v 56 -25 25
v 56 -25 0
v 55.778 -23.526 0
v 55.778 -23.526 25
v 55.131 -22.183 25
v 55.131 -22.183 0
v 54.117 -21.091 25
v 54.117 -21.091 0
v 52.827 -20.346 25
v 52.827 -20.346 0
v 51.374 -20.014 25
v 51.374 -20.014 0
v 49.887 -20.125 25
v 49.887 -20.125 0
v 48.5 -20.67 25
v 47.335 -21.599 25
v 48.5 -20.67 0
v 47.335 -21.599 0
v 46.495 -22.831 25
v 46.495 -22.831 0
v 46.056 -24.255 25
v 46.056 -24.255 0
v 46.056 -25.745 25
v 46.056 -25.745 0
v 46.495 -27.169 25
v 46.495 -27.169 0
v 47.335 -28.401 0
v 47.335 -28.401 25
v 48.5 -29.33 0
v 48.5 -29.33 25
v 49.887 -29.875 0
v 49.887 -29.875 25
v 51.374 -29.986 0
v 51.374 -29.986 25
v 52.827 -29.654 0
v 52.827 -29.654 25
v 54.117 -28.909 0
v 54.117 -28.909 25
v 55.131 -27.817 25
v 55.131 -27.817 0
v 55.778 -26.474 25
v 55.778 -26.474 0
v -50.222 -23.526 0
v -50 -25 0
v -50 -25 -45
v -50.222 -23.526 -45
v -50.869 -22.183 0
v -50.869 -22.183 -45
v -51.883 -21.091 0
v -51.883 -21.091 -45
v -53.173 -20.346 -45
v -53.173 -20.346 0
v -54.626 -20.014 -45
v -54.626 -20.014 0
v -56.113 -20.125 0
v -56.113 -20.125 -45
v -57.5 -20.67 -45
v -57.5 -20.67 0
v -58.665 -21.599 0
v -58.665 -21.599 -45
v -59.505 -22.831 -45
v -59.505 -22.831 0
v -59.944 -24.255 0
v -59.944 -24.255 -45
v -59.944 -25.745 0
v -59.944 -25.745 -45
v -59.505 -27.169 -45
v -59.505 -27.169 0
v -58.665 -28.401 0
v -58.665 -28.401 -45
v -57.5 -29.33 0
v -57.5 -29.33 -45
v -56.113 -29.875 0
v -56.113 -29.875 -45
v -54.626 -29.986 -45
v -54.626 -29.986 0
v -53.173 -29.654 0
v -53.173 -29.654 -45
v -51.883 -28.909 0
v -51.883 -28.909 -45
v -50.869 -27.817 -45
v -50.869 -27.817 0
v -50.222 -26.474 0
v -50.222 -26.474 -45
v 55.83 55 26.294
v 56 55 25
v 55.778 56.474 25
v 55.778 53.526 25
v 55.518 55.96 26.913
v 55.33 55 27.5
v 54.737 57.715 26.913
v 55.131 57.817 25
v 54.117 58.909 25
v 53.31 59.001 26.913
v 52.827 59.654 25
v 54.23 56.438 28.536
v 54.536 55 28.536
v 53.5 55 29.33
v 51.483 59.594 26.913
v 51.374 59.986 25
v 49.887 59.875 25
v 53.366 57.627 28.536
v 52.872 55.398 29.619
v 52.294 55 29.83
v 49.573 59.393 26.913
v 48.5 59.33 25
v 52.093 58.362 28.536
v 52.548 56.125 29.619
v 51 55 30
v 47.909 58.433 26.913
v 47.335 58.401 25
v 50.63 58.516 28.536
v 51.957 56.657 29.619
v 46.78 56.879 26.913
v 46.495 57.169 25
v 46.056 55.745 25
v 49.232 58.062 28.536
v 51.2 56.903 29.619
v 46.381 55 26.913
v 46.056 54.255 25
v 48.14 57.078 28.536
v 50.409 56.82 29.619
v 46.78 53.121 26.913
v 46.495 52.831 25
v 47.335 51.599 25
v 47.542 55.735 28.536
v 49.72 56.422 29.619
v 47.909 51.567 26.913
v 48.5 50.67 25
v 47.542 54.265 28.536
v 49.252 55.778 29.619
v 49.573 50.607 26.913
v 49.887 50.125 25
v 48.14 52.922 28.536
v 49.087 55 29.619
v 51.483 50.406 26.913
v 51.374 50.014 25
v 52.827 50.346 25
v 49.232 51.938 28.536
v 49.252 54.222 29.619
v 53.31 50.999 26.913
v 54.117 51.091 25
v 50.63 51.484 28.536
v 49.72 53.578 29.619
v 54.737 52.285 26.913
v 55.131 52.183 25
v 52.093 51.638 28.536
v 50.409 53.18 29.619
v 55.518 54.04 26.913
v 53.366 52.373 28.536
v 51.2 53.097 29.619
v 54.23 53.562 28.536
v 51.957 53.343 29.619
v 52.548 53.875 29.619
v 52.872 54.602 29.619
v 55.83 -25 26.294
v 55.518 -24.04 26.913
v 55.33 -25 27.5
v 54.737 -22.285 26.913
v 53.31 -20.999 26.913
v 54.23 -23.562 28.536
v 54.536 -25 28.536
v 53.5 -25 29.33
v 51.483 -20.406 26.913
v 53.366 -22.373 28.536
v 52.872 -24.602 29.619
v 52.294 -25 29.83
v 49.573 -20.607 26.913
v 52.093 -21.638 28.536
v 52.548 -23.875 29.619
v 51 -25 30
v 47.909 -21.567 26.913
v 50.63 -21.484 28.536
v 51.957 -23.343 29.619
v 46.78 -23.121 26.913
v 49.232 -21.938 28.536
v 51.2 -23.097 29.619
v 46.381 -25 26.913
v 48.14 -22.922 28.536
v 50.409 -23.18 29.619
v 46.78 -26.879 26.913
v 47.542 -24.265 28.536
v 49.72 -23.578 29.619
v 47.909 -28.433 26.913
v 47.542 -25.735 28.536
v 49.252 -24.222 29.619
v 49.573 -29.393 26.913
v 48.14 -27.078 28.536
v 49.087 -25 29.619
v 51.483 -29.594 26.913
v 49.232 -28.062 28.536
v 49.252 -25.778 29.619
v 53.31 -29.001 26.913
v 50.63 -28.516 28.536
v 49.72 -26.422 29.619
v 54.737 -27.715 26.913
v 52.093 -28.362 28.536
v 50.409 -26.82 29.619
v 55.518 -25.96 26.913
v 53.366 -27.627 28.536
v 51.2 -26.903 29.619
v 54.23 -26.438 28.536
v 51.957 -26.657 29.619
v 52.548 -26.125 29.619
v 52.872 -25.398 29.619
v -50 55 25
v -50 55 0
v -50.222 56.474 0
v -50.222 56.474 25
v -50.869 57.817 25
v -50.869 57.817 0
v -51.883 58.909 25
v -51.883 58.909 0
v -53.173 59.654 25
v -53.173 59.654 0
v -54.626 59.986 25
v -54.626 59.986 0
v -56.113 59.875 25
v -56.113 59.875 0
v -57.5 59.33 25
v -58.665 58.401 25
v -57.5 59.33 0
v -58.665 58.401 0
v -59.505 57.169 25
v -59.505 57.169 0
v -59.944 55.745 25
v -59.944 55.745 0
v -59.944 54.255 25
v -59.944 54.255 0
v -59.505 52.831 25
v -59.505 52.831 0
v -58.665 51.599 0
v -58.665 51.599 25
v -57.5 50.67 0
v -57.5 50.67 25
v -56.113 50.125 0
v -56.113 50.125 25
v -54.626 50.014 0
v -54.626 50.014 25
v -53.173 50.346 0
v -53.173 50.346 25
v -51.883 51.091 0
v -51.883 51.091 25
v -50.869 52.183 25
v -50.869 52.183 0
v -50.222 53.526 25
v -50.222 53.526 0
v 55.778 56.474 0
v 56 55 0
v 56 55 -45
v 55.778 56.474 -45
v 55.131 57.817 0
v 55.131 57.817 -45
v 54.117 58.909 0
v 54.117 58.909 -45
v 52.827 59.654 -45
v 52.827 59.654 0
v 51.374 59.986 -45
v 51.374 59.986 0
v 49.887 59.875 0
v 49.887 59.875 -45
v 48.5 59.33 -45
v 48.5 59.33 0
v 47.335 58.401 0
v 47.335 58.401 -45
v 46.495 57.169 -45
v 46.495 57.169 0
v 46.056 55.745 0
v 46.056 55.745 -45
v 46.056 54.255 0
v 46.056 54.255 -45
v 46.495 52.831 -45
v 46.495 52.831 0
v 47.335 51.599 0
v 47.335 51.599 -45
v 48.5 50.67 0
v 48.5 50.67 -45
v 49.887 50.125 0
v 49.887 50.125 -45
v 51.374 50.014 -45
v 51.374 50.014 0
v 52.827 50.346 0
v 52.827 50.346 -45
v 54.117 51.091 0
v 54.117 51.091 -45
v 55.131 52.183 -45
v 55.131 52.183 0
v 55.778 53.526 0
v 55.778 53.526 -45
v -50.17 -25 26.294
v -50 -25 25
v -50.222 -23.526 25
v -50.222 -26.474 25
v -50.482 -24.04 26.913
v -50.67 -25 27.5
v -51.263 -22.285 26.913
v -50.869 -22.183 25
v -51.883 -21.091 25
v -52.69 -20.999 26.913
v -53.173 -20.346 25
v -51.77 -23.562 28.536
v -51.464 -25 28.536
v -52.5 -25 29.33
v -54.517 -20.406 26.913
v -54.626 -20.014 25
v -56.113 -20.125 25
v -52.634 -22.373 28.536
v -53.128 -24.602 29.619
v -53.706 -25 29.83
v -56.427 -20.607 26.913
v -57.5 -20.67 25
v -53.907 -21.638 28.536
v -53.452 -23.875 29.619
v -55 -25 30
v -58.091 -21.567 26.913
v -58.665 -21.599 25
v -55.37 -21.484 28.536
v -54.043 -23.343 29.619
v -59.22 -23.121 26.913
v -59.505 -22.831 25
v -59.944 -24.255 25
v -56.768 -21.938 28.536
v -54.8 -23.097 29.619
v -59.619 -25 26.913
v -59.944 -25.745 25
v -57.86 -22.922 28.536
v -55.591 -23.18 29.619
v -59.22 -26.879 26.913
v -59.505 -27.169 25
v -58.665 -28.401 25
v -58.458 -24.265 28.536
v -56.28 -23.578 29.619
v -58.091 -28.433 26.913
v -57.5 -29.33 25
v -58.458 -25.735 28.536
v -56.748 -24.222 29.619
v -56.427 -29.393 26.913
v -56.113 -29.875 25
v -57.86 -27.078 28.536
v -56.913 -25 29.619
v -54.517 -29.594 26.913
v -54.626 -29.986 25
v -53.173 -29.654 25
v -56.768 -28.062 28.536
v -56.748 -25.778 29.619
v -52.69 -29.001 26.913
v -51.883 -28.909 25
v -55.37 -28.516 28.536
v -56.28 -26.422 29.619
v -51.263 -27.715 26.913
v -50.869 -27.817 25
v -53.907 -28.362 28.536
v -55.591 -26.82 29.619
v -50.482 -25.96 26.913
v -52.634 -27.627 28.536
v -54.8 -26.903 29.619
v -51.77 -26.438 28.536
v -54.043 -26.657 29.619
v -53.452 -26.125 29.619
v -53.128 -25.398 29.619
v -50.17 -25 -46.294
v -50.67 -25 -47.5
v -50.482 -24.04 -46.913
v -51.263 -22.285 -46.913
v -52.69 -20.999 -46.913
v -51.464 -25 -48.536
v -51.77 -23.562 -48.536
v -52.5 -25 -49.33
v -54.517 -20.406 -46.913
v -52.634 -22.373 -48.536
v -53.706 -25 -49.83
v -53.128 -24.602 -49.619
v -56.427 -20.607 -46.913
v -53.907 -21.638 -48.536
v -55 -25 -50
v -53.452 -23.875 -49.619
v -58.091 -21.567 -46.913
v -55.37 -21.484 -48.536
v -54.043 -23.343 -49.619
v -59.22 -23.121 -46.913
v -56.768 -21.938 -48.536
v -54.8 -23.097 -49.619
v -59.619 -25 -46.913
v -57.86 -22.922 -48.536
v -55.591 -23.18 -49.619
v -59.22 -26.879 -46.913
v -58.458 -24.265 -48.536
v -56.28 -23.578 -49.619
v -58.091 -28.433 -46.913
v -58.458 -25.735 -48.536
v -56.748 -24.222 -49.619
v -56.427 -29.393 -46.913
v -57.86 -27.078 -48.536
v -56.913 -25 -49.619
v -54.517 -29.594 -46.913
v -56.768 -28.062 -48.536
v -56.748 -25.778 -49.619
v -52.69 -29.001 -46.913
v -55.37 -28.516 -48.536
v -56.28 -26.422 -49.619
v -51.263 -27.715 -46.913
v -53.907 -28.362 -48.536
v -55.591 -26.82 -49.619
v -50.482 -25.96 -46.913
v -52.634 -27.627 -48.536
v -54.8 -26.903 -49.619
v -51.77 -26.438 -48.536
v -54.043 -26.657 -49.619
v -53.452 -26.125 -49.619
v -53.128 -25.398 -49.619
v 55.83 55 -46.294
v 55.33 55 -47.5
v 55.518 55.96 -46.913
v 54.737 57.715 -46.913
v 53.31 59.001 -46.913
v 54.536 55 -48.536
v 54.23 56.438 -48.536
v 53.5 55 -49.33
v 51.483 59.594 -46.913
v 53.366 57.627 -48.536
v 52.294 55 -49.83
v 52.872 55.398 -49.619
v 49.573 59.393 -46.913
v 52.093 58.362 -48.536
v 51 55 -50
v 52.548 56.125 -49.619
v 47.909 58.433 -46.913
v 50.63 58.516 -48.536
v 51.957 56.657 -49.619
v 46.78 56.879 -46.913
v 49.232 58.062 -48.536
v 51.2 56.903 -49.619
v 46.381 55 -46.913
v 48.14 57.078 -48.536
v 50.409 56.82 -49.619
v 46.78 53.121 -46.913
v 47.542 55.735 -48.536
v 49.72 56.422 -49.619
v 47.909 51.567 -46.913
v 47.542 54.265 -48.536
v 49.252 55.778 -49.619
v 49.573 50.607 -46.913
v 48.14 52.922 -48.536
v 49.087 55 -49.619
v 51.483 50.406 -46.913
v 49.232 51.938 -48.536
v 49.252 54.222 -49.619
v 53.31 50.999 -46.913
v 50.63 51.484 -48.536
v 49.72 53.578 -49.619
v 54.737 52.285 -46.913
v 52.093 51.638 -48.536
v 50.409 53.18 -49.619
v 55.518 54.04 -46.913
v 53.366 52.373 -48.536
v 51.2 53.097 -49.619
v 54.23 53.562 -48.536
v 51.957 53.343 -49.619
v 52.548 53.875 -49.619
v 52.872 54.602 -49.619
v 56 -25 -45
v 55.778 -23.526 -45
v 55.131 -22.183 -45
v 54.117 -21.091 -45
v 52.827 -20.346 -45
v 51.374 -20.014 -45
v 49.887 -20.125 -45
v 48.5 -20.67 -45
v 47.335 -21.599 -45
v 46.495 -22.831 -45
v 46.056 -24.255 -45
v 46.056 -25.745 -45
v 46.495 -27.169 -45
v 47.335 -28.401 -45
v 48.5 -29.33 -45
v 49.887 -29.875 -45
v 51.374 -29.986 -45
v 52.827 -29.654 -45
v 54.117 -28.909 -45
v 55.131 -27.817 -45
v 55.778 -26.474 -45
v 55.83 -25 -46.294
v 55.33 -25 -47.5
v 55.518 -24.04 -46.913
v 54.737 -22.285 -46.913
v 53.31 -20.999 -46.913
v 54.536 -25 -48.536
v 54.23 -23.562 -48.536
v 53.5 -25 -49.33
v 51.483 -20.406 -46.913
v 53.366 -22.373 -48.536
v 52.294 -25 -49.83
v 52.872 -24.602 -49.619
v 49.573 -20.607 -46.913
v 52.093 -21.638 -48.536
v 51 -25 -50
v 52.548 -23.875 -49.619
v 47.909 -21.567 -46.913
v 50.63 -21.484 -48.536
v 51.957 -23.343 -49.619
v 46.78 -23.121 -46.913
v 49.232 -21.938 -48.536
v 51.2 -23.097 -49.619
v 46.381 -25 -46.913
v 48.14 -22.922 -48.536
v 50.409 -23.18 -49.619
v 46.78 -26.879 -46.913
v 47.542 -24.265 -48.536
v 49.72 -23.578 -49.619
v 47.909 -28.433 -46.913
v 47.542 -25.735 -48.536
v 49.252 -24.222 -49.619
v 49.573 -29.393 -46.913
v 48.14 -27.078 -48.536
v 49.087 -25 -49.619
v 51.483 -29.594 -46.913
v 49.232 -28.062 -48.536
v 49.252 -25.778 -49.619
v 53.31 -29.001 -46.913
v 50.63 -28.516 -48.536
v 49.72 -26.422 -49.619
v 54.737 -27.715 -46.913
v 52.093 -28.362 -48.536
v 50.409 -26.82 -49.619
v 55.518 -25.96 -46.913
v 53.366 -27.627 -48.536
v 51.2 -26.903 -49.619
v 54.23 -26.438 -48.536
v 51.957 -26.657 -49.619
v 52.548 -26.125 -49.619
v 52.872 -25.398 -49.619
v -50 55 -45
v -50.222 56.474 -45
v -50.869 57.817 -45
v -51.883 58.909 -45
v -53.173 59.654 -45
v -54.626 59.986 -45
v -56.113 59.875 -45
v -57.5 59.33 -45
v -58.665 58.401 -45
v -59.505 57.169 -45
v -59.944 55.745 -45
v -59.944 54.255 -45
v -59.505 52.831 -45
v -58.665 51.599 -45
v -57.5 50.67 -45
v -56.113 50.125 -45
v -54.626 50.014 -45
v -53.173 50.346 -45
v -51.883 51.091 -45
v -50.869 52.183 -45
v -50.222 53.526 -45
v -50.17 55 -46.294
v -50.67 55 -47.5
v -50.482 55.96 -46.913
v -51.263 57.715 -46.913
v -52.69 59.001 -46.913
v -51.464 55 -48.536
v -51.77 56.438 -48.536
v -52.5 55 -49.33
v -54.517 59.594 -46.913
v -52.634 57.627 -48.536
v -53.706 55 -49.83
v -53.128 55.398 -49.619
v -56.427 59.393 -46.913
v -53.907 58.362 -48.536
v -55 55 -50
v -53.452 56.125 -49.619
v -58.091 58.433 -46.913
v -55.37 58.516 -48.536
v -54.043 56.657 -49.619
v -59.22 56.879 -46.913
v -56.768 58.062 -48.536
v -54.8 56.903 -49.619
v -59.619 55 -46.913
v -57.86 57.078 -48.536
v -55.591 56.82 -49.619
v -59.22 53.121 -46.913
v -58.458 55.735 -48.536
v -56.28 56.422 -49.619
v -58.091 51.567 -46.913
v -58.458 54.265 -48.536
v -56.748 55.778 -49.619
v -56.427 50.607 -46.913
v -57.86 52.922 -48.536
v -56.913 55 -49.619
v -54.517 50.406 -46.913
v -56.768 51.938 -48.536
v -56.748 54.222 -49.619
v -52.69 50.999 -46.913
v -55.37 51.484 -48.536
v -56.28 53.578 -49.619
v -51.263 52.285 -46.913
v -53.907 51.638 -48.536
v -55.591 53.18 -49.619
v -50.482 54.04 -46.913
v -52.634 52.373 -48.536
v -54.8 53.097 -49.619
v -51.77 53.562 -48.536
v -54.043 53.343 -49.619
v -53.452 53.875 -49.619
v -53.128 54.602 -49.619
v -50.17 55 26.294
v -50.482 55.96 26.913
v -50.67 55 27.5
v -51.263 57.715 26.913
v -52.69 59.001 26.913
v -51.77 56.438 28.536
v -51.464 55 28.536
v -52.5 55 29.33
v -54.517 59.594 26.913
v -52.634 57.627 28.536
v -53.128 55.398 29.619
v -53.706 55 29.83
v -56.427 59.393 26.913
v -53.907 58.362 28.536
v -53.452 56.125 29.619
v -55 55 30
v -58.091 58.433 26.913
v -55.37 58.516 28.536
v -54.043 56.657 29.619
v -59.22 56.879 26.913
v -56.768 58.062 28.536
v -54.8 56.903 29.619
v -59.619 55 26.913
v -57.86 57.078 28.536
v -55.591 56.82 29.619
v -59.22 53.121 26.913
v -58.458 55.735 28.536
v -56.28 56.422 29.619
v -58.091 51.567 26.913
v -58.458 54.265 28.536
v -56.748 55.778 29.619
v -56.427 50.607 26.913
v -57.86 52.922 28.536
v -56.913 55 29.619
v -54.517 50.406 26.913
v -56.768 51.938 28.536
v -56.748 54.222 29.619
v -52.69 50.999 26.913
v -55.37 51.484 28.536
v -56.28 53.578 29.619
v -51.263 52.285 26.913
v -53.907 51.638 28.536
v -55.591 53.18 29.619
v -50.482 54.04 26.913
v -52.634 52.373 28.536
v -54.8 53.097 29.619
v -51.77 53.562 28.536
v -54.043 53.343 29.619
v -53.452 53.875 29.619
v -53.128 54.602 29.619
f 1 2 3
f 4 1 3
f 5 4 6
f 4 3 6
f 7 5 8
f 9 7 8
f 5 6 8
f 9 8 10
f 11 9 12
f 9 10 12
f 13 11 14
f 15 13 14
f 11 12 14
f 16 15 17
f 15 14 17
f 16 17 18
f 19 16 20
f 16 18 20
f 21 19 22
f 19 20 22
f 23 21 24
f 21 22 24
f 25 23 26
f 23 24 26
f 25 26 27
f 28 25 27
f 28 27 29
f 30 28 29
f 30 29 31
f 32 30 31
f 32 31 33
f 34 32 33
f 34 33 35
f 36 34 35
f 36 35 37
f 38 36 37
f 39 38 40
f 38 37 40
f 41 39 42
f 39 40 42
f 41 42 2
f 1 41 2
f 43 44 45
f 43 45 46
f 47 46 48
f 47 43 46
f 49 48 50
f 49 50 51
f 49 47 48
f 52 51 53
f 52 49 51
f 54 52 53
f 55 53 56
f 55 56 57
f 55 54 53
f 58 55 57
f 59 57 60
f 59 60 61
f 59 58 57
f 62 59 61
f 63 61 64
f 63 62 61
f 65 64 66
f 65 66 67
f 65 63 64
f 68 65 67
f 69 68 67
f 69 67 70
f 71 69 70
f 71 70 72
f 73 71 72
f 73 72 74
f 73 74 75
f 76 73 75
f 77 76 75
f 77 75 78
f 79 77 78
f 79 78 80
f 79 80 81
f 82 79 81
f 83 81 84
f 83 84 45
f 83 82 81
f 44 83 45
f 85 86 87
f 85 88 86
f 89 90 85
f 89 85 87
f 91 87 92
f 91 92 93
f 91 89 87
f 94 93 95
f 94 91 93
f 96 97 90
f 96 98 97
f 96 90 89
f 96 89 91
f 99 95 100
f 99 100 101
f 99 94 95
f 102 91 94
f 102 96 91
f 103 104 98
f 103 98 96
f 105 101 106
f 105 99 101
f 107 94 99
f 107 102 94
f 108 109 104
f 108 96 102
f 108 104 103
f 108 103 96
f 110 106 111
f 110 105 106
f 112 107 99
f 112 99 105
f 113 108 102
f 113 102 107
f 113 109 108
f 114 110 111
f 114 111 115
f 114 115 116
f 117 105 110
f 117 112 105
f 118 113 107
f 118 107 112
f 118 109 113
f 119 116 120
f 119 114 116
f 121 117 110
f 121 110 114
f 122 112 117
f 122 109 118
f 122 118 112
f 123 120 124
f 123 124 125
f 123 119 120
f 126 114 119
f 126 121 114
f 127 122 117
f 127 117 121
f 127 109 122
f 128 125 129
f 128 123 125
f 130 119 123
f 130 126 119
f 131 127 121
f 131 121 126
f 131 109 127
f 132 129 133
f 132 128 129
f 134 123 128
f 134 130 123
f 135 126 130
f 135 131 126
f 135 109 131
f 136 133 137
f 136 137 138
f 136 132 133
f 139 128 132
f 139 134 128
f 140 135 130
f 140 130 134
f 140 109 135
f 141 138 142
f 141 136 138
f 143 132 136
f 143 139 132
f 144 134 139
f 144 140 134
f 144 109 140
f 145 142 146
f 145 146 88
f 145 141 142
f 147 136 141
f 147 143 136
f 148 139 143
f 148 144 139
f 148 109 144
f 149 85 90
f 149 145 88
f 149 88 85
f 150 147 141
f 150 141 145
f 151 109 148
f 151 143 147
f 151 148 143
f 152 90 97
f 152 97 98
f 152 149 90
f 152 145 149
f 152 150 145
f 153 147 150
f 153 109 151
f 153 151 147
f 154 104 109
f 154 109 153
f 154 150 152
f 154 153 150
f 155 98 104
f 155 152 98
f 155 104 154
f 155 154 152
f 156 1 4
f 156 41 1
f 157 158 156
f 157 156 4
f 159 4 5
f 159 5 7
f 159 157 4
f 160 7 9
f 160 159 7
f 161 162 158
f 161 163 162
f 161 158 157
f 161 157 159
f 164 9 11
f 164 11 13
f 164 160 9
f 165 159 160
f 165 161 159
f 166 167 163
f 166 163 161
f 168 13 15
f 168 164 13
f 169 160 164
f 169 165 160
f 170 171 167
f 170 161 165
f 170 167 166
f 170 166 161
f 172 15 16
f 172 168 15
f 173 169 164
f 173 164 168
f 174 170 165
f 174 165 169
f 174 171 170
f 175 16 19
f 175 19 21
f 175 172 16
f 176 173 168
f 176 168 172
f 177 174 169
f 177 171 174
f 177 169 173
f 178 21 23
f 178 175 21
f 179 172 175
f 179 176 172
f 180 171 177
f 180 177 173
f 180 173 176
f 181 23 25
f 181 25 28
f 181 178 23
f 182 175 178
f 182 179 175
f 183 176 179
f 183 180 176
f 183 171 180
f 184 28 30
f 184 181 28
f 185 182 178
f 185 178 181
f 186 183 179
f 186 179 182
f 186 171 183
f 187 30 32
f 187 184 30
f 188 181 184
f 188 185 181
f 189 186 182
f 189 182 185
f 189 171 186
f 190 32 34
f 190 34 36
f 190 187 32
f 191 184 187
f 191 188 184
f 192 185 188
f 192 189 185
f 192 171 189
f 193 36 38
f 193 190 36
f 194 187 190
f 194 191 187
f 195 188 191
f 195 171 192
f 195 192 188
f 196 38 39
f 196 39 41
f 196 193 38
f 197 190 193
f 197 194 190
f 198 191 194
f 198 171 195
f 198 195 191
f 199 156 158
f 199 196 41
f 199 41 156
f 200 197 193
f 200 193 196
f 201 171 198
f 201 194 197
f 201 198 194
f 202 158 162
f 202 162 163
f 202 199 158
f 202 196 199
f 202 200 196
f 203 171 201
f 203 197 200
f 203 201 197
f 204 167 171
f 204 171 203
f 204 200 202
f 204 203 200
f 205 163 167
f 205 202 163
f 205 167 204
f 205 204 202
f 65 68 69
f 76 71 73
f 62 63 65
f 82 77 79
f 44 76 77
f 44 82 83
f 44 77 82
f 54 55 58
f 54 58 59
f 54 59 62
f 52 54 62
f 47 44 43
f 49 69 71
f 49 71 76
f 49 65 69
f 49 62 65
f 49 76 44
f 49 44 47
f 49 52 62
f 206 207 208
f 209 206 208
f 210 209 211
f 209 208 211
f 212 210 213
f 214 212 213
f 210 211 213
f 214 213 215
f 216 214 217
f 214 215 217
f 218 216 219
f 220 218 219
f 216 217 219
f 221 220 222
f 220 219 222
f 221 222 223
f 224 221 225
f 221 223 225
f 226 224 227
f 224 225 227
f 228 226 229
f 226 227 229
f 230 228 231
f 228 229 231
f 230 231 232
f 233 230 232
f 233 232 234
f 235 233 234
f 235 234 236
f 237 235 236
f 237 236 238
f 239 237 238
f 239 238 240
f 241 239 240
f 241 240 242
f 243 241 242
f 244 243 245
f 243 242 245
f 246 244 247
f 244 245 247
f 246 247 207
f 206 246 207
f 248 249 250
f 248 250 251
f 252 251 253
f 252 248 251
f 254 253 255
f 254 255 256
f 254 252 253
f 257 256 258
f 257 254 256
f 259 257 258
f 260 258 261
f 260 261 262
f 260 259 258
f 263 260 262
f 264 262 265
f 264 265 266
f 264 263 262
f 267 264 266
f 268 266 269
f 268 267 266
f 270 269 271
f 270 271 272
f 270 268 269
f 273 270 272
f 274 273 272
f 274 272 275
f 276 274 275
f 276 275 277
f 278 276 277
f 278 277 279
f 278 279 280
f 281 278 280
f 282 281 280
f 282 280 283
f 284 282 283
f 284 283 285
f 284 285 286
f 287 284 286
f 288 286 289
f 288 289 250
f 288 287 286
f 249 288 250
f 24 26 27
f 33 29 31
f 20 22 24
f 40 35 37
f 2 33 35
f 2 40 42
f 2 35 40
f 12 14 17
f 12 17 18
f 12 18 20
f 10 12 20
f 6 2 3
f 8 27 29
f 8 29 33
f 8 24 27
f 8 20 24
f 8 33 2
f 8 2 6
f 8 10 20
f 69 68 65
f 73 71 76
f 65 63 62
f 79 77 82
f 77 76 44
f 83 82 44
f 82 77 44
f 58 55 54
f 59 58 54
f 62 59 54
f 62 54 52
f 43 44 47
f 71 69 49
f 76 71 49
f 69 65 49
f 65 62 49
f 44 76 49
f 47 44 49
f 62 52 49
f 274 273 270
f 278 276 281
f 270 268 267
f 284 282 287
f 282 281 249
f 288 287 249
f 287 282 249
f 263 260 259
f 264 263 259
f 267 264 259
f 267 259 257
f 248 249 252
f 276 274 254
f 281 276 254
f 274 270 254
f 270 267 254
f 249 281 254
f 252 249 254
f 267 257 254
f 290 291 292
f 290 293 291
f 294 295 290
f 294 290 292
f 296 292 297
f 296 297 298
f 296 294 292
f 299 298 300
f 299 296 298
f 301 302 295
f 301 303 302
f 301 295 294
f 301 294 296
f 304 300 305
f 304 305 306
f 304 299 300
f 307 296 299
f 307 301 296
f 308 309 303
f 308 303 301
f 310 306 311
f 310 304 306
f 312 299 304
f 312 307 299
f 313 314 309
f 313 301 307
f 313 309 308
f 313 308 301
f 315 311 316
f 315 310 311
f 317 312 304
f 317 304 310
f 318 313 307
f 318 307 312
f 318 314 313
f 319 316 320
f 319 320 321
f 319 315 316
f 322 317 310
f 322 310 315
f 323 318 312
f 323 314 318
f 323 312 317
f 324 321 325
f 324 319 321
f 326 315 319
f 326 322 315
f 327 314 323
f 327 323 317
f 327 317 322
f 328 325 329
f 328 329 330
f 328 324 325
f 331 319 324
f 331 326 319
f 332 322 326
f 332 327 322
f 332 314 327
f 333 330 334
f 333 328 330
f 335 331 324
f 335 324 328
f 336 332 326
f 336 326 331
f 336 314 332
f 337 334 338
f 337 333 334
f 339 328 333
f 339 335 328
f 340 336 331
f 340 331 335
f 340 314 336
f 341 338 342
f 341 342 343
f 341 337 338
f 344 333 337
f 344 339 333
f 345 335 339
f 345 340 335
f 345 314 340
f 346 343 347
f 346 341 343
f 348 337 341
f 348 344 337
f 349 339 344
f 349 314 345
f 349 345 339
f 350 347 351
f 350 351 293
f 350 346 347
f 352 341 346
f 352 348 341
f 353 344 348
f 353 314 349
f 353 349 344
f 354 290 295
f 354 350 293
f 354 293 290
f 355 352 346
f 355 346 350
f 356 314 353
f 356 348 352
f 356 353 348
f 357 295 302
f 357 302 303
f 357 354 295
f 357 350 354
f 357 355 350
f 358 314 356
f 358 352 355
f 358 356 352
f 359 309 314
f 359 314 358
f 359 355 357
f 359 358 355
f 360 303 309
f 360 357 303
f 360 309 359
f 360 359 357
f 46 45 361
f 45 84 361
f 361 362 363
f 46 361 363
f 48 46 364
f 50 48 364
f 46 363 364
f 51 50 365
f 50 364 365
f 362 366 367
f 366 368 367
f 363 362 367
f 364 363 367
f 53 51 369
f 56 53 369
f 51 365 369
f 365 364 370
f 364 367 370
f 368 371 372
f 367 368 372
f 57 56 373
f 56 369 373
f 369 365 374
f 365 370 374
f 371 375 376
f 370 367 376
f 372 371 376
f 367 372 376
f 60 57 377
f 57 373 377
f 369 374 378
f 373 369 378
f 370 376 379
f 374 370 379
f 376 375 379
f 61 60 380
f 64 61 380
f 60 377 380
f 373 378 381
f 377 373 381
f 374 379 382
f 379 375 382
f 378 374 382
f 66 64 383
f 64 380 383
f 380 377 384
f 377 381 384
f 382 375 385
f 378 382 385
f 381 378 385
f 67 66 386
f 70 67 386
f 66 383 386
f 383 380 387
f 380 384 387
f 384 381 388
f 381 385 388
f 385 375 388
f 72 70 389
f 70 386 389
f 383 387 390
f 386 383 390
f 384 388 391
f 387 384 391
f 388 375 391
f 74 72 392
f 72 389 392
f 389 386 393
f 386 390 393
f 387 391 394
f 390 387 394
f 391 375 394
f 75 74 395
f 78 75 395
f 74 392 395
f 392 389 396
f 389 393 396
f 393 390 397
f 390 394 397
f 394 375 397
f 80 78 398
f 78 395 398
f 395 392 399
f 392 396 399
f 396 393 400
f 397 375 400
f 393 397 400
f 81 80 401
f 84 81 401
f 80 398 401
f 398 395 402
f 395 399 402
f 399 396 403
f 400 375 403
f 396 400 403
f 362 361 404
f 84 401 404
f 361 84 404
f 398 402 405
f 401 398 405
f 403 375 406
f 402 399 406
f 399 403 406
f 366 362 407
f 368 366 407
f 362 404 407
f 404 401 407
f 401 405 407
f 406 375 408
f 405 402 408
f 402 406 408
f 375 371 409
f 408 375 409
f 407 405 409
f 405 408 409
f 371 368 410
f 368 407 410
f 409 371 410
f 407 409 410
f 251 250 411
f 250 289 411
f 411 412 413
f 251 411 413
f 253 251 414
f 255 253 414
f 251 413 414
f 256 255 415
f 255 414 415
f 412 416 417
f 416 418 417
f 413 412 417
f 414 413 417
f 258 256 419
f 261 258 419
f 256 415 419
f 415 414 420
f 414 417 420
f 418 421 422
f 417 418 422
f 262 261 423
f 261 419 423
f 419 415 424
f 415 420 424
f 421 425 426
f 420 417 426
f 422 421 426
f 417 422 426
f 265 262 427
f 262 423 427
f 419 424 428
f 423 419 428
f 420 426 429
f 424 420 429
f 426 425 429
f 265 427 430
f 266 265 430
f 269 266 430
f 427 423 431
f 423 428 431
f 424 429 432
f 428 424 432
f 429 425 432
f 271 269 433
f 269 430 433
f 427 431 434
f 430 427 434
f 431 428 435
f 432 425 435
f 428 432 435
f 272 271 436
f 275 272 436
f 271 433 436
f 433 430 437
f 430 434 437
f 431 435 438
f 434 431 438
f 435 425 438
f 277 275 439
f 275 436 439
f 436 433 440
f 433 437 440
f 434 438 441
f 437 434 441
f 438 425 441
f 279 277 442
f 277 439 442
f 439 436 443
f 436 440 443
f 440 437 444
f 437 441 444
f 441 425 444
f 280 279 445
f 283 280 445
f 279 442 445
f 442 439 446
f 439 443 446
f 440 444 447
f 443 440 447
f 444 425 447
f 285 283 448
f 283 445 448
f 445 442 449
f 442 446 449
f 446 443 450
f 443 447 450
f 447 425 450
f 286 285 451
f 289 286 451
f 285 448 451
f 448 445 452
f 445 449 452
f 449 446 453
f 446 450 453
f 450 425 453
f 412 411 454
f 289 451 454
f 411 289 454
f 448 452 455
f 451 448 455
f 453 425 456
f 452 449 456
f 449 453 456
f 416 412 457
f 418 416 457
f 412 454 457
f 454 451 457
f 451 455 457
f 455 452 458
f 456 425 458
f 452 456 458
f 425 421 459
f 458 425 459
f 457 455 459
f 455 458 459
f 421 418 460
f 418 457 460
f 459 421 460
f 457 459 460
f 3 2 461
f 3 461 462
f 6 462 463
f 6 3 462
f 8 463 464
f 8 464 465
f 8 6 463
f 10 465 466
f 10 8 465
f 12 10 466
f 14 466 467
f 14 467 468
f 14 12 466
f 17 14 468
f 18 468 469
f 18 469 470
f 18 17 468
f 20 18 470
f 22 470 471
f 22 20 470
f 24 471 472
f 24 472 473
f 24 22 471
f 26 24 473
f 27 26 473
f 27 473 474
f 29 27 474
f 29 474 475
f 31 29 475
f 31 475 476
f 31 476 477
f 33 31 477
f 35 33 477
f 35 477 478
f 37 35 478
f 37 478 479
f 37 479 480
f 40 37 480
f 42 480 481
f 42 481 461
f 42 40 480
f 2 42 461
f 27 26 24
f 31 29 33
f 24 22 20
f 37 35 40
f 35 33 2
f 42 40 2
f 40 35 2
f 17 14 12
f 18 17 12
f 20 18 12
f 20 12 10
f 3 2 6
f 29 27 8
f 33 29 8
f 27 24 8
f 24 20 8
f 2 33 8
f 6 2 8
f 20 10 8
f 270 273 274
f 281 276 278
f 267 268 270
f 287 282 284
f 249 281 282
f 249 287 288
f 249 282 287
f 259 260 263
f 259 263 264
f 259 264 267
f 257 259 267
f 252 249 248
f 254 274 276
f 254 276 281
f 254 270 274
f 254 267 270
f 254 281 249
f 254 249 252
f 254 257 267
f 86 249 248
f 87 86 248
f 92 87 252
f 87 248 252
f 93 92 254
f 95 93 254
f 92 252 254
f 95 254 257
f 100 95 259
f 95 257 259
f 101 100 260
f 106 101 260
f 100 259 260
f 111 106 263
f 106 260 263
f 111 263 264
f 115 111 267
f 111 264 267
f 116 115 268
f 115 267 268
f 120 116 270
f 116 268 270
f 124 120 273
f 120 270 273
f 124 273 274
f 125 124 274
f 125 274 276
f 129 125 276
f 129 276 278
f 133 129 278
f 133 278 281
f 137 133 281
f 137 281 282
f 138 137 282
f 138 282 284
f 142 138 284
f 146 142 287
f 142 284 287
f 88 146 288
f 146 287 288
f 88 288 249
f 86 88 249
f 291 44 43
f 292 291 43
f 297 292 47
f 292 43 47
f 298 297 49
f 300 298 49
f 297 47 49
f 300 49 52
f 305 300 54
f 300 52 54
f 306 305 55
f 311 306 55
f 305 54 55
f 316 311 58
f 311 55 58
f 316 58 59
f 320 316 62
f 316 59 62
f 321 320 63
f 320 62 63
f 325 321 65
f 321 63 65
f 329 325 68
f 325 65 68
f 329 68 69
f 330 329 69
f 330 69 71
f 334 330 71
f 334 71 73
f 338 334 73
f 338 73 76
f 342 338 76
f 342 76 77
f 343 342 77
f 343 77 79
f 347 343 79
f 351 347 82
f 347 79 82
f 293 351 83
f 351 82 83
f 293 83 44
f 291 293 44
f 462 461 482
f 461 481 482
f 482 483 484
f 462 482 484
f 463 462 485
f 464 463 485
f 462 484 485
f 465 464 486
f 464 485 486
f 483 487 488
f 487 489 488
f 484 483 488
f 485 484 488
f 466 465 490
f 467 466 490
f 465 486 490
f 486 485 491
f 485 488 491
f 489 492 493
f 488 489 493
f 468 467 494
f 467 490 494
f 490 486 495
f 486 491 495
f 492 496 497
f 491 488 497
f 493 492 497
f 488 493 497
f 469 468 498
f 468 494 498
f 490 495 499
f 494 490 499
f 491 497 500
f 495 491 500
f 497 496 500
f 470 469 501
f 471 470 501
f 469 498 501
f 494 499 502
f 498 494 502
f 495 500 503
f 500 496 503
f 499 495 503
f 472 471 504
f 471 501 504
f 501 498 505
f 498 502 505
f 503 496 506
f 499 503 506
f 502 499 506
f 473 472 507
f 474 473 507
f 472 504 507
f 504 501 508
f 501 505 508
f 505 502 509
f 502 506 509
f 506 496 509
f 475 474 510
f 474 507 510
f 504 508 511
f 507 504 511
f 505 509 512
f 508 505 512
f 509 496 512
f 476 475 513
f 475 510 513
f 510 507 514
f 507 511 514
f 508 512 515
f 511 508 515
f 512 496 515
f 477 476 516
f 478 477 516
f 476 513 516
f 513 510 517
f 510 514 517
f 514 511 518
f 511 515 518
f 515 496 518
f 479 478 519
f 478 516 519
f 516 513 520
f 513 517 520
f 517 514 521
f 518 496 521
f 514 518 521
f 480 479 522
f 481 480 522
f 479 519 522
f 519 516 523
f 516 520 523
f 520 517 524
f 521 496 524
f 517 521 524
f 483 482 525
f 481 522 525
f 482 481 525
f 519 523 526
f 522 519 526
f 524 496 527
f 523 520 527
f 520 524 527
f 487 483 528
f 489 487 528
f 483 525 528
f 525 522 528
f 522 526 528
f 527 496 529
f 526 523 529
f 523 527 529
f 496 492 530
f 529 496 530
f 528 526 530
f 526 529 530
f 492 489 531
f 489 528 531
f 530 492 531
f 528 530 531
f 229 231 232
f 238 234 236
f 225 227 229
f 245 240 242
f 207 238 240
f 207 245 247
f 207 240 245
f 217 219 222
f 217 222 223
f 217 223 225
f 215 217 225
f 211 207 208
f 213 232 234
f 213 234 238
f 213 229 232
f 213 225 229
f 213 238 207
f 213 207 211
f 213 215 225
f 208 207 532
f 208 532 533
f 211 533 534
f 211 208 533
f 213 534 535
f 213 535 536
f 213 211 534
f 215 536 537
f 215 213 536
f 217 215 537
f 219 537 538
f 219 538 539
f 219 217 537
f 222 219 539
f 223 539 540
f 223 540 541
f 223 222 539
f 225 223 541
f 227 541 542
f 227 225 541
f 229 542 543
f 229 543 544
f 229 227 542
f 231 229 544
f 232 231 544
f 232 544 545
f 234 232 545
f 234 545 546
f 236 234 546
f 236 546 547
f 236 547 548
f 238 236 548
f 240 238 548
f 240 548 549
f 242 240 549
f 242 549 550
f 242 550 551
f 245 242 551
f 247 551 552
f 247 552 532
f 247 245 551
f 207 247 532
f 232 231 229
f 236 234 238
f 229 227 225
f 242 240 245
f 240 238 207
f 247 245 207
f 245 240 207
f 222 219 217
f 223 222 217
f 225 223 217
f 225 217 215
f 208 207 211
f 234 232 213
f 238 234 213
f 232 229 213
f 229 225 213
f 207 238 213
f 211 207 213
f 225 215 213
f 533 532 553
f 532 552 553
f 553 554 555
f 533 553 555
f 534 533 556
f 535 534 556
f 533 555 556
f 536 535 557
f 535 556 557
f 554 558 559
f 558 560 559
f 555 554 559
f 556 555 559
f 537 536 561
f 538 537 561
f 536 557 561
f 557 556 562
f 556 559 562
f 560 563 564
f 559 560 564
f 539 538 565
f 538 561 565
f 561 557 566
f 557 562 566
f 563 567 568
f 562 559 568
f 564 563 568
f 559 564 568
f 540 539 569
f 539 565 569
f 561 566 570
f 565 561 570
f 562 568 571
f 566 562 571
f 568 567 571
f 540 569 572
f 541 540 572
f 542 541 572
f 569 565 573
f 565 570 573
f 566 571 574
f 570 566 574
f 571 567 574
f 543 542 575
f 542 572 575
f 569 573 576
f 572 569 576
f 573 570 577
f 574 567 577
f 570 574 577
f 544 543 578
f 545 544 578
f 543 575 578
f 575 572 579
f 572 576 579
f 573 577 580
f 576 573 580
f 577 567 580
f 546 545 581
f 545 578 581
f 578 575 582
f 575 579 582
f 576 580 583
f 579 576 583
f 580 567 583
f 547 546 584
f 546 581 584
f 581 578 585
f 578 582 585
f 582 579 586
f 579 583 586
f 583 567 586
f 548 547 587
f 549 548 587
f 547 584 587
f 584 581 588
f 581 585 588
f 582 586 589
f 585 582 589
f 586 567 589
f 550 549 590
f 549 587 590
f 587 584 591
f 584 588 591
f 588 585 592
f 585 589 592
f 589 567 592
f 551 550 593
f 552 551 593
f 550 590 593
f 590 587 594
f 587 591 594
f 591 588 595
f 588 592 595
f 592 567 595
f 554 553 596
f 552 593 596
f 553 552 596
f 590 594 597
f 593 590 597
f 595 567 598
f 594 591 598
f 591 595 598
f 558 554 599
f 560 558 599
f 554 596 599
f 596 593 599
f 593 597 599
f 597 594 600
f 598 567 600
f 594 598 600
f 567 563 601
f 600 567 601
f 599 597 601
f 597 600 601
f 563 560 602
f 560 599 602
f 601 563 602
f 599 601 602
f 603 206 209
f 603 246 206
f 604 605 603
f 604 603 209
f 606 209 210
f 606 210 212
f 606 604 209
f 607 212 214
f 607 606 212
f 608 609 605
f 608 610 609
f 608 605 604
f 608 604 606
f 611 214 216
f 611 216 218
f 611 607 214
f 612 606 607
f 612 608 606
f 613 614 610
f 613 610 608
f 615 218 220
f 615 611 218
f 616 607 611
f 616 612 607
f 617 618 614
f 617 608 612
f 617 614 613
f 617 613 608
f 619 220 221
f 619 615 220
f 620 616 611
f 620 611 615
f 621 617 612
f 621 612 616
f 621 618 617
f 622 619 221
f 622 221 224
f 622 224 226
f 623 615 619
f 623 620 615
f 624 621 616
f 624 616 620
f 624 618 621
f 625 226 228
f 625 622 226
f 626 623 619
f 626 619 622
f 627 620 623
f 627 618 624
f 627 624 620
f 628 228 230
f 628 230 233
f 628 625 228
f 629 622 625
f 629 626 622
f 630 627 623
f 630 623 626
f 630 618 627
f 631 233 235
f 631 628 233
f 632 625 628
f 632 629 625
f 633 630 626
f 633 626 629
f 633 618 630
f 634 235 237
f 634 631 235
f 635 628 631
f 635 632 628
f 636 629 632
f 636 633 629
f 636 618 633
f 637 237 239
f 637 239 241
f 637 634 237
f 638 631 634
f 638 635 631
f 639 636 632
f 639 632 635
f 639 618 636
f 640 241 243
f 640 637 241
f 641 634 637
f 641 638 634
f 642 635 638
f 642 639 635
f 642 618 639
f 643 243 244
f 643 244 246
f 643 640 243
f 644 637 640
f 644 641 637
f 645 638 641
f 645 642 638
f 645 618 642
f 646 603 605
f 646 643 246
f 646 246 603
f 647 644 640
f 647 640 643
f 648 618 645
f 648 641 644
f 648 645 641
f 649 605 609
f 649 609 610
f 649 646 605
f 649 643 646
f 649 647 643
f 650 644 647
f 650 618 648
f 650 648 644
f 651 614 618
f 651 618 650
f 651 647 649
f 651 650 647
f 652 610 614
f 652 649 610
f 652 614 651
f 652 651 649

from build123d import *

# Parameters (mm, degrees)
F0_R      = 5
F1_DEPTH  = 50
F1_FACE_R = 5
F2_DEPTH  = 30
F3_R      = 5
F3_2_R    = 5


with BuildPart() as f1:
    # F0 (on Top) → F1 (new body)
    with BuildSketch(Plane.XY):
        with Locations((-55, 55)):
            Circle(F0_R)
        with Locations((51, 55)):
            Circle(F0_R)
        with Locations((51, -25)):
            Circle(F0_R)
        with Locations((-55, -25)):
            Circle(F0_R)
    extrude(amount=-F1_DEPTH)

    # F3#2
    f3_2_edges = [f1.edges().sort_by_distance(p)[0] for p in [
        (-60, 55, -50),
        (46, 55, -50),
        (46, -25, -50),
        (-60, -25, -50),
    ]]
    fillet(f3_2_edges, radius=F3_2_R)


with BuildPart() as f2:
    # F1_face (on face) → F2 (new body)
    with BuildSketch(Plane(origin=(-55, 55, 0), x_dir=(1, 0, 0), z_dir=(0, 0, 1))):
        Circle(F1_FACE_R)
        with Locations((106, 0)):
            Circle(F1_FACE_R)
        with Locations((106, -80)):
            Circle(F1_FACE_R)
        with Locations((0, -80)):
            Circle(F1_FACE_R)
    extrude(amount=F2_DEPTH)

    # F3
    f3_edges = [f2.edges().sort_by_distance(p)[0] for p in [
        (-60, 55, 30),
        (46, 55, 30),
        (46, -25, 30),
        (-60, -25, 30),
    ]]
    fillet(f3_edges, radius=F3_R)


solid = Compound([f1.part, f2.part])
